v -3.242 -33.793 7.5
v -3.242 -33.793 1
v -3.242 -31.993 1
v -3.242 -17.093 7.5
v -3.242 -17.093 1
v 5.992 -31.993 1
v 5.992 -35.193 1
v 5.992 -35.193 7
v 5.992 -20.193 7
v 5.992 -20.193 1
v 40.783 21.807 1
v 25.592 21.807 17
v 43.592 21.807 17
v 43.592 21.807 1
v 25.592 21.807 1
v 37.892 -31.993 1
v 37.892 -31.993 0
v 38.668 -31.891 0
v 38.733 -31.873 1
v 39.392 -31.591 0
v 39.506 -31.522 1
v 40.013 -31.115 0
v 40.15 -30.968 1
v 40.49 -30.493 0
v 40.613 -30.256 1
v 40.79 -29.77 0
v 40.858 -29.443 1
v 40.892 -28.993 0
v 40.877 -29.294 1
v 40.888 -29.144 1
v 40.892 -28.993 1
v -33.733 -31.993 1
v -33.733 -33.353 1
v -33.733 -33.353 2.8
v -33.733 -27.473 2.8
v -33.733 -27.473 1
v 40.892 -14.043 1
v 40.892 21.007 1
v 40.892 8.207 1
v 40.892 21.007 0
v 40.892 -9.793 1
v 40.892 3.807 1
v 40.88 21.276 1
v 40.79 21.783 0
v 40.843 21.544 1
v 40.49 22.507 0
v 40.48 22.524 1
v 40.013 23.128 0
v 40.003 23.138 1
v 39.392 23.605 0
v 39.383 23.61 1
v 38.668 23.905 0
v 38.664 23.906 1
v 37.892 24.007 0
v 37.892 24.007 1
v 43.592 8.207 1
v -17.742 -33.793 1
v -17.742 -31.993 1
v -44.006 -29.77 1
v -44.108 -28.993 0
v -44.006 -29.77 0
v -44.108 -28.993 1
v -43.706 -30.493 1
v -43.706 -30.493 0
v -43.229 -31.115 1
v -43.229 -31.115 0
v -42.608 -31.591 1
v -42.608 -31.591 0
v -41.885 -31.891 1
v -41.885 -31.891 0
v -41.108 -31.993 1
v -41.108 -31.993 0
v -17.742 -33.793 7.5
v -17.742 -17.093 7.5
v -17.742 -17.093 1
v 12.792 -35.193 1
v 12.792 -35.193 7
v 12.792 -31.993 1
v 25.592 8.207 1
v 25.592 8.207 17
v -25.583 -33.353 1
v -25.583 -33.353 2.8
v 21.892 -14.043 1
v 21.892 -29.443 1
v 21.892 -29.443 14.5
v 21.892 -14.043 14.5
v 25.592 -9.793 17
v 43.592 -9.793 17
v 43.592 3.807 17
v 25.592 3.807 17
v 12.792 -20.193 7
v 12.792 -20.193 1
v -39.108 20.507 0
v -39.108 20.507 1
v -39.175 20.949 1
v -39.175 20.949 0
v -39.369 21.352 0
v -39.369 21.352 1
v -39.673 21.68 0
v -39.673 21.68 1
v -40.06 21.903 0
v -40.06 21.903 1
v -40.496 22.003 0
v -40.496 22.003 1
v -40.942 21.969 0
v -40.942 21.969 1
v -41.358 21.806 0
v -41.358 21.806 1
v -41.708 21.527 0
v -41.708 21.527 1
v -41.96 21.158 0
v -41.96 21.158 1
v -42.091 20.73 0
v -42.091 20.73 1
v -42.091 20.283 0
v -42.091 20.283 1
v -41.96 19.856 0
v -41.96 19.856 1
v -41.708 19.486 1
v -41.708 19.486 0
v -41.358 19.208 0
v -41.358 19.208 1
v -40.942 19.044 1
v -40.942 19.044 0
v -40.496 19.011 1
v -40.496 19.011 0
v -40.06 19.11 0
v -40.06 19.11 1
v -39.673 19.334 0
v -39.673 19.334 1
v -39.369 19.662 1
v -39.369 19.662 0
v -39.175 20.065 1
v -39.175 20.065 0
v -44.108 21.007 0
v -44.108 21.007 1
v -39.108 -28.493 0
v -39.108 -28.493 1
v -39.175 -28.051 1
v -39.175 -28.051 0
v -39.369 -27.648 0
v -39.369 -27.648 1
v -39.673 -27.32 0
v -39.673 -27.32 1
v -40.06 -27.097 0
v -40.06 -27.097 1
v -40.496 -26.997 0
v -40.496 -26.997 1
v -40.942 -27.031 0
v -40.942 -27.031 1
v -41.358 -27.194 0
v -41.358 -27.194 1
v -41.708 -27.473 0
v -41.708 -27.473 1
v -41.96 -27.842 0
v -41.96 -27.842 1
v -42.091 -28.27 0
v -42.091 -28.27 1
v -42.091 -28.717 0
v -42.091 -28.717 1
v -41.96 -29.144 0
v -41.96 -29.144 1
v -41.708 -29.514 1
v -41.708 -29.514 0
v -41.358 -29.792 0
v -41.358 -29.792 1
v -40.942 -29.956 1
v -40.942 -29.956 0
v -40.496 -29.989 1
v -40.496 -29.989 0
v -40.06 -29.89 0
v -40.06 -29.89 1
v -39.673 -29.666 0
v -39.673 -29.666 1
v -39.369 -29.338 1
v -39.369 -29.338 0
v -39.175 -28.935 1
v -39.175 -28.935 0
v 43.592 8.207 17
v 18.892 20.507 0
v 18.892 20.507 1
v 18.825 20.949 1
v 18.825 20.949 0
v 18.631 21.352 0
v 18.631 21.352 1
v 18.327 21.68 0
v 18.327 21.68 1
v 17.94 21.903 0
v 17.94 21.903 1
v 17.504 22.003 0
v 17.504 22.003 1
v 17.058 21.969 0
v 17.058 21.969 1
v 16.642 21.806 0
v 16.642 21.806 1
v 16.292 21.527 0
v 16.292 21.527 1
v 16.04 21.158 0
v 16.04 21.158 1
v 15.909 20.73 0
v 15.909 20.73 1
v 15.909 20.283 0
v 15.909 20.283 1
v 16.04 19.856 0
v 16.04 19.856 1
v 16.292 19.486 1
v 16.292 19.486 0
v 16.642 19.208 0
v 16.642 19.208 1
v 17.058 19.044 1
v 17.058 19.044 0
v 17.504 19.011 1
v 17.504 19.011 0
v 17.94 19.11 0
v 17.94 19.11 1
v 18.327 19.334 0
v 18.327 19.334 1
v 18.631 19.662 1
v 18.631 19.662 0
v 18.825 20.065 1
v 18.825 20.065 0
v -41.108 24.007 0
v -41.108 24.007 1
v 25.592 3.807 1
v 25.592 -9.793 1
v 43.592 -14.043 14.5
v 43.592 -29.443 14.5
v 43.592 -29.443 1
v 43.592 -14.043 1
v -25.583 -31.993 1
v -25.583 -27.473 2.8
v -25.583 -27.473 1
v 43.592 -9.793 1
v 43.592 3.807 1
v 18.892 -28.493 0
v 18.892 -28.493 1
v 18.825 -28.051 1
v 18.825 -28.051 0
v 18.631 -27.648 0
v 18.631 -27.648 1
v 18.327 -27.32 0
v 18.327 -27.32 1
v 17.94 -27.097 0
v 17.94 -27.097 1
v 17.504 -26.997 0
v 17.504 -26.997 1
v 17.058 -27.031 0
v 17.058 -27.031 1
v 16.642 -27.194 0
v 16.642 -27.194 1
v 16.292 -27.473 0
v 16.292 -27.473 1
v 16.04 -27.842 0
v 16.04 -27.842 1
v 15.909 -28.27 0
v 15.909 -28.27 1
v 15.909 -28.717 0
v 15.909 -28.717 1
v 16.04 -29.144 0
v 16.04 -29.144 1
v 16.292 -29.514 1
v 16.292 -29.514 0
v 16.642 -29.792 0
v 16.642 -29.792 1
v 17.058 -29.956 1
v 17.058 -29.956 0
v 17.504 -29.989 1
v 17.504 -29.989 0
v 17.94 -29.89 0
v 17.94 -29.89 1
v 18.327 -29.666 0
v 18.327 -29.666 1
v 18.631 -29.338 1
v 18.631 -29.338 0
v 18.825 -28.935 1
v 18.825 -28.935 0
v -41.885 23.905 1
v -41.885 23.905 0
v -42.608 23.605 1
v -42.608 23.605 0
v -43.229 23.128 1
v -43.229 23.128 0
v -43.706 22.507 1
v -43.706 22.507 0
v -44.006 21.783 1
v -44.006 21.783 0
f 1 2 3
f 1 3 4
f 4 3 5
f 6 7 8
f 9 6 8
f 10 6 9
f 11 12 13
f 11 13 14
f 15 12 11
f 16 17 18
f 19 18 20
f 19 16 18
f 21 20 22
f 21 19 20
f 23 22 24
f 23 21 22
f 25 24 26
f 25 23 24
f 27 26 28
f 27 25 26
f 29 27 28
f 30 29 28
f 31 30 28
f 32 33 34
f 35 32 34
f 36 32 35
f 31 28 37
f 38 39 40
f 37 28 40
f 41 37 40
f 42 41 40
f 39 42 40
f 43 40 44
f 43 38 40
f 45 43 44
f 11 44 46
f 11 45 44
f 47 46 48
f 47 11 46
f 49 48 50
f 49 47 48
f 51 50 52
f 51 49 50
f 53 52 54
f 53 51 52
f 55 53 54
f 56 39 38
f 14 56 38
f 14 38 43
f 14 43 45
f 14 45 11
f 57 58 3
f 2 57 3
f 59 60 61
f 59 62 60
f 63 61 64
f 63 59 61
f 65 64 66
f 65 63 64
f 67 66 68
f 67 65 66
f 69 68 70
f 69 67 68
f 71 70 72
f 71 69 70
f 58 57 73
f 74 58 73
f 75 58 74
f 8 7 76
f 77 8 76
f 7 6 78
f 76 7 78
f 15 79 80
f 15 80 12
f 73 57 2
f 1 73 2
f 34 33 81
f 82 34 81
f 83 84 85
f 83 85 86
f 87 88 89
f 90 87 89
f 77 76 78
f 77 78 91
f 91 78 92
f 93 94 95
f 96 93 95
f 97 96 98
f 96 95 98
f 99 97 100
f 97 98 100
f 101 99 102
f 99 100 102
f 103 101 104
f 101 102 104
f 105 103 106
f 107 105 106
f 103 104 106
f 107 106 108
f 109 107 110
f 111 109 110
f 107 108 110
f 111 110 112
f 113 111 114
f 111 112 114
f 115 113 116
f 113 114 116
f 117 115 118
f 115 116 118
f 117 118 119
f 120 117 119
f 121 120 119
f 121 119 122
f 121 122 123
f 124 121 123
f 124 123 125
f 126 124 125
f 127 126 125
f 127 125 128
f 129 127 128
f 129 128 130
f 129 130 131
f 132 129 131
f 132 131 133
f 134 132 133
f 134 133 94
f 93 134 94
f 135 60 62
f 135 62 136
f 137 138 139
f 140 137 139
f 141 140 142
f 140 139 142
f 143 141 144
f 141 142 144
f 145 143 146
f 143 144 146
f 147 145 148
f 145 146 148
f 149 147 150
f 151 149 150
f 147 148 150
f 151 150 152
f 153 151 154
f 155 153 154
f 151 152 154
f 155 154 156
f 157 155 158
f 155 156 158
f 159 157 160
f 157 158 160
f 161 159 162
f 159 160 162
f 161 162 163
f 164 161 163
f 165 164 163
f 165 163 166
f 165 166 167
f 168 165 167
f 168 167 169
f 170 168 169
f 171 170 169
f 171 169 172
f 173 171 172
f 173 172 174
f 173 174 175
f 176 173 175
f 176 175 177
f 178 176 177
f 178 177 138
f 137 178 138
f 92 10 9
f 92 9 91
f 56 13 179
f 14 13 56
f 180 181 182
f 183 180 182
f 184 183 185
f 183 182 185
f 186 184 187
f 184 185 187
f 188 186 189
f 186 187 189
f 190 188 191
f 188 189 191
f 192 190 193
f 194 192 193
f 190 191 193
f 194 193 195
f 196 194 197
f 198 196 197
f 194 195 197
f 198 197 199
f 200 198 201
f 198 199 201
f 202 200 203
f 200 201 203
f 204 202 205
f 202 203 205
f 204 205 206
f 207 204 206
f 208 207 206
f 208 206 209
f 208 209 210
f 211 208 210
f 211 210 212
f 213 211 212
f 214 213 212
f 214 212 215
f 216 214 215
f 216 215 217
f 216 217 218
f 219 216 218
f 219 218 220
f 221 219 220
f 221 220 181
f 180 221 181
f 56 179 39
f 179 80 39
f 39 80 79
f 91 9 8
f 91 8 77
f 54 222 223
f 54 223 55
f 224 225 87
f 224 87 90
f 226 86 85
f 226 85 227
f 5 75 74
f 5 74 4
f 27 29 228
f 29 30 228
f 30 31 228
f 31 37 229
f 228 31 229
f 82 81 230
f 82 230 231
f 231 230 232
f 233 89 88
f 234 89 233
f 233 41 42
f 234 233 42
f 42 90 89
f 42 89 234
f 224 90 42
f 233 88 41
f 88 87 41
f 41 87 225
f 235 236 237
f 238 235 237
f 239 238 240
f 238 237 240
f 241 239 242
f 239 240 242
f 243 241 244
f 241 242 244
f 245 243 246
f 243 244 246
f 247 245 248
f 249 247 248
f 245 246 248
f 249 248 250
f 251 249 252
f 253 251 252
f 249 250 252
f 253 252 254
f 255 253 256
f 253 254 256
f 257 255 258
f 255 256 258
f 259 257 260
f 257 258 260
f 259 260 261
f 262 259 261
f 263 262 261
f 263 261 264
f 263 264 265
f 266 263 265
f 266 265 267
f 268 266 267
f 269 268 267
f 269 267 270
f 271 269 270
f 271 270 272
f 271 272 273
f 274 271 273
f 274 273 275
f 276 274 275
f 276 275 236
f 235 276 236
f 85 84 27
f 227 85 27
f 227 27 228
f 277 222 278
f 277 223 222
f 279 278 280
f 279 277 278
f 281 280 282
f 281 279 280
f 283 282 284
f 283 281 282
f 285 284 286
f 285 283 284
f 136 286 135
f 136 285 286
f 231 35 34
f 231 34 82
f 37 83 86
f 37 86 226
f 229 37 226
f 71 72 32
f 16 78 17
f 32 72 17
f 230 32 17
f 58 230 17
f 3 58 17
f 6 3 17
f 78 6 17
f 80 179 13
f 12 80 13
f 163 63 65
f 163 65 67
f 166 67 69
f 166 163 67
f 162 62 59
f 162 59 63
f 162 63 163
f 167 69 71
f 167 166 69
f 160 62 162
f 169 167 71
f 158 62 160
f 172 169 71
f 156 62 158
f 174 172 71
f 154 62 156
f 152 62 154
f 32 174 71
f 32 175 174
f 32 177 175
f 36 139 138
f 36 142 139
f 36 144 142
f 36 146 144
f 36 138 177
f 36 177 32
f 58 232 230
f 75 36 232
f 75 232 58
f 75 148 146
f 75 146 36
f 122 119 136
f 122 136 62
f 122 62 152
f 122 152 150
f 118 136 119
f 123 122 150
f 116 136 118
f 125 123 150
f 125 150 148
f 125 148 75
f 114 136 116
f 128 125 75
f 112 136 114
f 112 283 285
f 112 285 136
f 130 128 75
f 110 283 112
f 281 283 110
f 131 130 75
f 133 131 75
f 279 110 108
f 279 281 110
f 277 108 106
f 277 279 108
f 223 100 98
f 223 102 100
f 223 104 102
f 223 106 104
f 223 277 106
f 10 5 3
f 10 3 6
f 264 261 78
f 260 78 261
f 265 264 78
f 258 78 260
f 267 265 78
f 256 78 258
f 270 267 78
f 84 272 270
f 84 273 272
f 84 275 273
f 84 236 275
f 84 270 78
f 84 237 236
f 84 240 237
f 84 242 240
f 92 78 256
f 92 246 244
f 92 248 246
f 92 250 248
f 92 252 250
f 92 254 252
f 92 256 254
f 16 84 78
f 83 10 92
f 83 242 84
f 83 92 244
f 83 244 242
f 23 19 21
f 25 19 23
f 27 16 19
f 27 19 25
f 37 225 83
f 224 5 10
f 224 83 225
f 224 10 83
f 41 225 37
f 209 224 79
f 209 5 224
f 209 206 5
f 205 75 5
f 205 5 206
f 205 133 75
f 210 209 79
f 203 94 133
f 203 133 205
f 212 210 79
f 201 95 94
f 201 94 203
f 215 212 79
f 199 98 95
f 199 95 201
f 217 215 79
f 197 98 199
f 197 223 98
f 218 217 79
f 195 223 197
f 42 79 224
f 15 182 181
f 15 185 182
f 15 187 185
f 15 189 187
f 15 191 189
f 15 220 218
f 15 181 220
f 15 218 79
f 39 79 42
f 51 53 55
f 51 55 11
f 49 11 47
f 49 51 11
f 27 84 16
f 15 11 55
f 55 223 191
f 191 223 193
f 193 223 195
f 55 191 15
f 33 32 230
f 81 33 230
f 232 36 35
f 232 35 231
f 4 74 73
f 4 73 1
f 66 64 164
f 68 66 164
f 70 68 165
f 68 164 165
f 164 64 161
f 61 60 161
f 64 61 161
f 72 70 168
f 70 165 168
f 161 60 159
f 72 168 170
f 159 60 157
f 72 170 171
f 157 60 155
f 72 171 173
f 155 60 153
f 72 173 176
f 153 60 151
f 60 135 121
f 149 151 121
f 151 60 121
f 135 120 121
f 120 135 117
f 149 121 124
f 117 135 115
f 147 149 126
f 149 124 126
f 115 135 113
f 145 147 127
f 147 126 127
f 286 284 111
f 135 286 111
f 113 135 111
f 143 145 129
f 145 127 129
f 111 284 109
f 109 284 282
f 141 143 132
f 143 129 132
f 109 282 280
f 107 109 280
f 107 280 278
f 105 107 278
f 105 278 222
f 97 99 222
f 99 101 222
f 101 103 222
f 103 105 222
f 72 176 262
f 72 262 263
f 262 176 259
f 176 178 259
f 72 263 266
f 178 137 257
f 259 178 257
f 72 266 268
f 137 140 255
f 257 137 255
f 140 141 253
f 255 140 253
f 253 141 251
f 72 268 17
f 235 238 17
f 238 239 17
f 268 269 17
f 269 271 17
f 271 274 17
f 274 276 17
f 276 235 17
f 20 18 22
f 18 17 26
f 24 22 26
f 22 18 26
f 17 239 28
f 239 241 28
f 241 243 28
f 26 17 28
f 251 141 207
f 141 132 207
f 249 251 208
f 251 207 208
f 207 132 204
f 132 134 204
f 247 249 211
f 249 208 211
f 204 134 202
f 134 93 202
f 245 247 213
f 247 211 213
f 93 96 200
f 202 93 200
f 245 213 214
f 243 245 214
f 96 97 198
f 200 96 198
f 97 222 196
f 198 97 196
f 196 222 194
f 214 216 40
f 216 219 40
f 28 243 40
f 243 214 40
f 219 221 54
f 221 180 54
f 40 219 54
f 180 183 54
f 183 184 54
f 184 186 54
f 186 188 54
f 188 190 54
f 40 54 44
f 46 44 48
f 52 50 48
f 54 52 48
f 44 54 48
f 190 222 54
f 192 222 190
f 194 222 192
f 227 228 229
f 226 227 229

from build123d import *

# Parameters (mm, degrees)
ESQUISSE1_W                = 85
ESQUISSE1_H                = 56
BOSS_EXTRU_1_DEPTH         = 1
CONG_3_R                   = 3
CONG_4_R                   = 3
CONG_5_R                   = 3
CONG_6_R                   = 3
ESQUISSE2_R                = 1.5
ENL_V_MAT_EXTRU_1_DEPTH    = 55.498557908
ESQUISSE3_W                = 15.3
ESQUISSE3_H                = 13.6
BOSS_EXTRU_3_DEPTH         = 16
ESQUISSE5_W                = 16
ESQUISSE5_H                = 13.6
BOSS_EXTRU_4_DEPTH         = 2.7
R_P_TITION_LIN_AIRE1_COUNT = 2
R_P_TITION_LIN_AIRE1_PITCH = 18
R_P_TITION_LIN_AIRE2_COUNT = 2
R_P_TITION_LIN_AIRE2_PITCH = 18
ESQUISSE7_W                = 21.7
ESQUISSE7_H                = 15.4
BOSS_EXTRU_5_DEPTH         = 13.5
ESQUISSE8_W                = 6.8
ESQUISSE8_H                = 15
BOSS_EXTRU_6_DEPTH         = 6
ESQUISSE9_W                = 14.5
ESQUISSE9_H                = 16.7
BOSS_EXTRU_7_DEPTH         = 6.5
ESQUISSE10_W               = 8.15
ESQUISSE10_H               = 5.88
BOSS_EXTRU_8_DEPTH         = 1.8


with BuildPart() as part:
    # Esquisse1 → Boss.-Extru.1 (new body)
    with BuildSketch(Plane.XY):
        with Locations((-1.608108108, -3.993243243)):
            Rectangle(ESQUISSE1_W, ESQUISSE1_H)
    extrude(amount=BOSS_EXTRU_1_DEPTH)

    # Congé3
    cong_3_edges = [part.edges().sort_by_distance(p)[0] for p in [
        (40.891891892, 24.006756757, 0.5),
    ]]
    fillet(cong_3_edges, radius=CONG_3_R)

    # Congé4
    cong_4_edges = [part.edges().sort_by_distance(p)[0] for p in [
        (-44.108108108, 24.006756757, 0.5),
    ]]
    fillet(cong_4_edges, radius=CONG_4_R)

    # Congé5
    cong_5_edges = [part.edges().sort_by_distance(p)[0] for p in [
        (-44.108108108, -31.993243243, 0.5),
    ]]
    fillet(cong_5_edges, radius=CONG_5_R)

    # Congé6
    cong_6_edges = [part.edges().sort_by_distance(p)[0] for p in [
        (40.891891892, -31.993243243, 0.5),
    ]]
    fillet(cong_6_edges, radius=CONG_6_R)

    # Esquisse2 → Enlèv. mat.-Extru.1 (cut, through all)
    with BuildSketch(Plane.XY.offset(1)):
        with Locations((-40.608108108, 20.506756757)):
            Circle(ESQUISSE2_R)
        with Locations((-40.608108108, -28.493243243)):
            Circle(ESQUISSE2_R)
        with Locations((17.391891892, -28.493243243)):
            Circle(ESQUISSE2_R)
        with Locations((17.391891892, 20.506756757)):
            Circle(ESQUISSE2_R)
    extrude(amount=-ENL_V_MAT_EXTRU_1_DEPTH, mode=Mode.SUBTRACT)

    # Esquisse3 → Boss.-Extru.3 (add)
    with BuildSketch(Plane.XY.offset(1)):
        with Locations((33.241891892, 15.006756757)):
            Rectangle(ESQUISSE3_W, ESQUISSE3_H)
    boss_extru_3 = extrude(amount=BOSS_EXTRU_3_DEPTH)

    # Esquisse5 → Boss.-Extru.4 (add)
    with BuildSketch(Plane(origin=(40.891891892, 0, 0), x_dir=(0, 0, -1), z_dir=(1, 0, 0))):
        with Locations((-9, 15.006756757)):
            Rectangle(ESQUISSE5_W, ESQUISSE5_H)
    boss_extru_4 = extrude(amount=BOSS_EXTRU_4_DEPTH)

    # Répétition linéaire1: Boss.-Extru.3 ×2
    with Locations(*[(0, -i * R_P_TITION_LIN_AIRE1_PITCH, 0) for i in range(1, R_P_TITION_LIN_AIRE1_COUNT)]):
        add(boss_extru_3)

    # Répétition linéaire2: Boss.-Extru.4 ×2
    with Locations(*[(0, -i * R_P_TITION_LIN_AIRE2_PITCH, 0) for i in range(1, R_P_TITION_LIN_AIRE2_COUNT)]):
        add(boss_extru_4)

    # Esquisse7 → Boss.-Extru.5 (add)
    with BuildSketch(Plane.XY.offset(1)):
        with Locations((32.741891892, -21.743243243)):
            Rectangle(ESQUISSE7_W, ESQUISSE7_H)
    extrude(amount=BOSS_EXTRU_5_DEPTH)

    # Esquisse8 → Boss.-Extru.6 (add)
    with BuildSketch(Plane.XY.offset(1)):
        with Locations((9.391891892, -27.693243243)):
            Rectangle(ESQUISSE8_W, ESQUISSE8_H)
    extrude(amount=BOSS_EXTRU_6_DEPTH)

    # Esquisse9 → Boss.-Extru.7 (add)
    with BuildSketch(Plane.XY.offset(1)):
        with Locations((-10.491721189, -25.443243243)):
            Rectangle(ESQUISSE9_W, ESQUISSE9_H)
    extrude(amount=BOSS_EXTRU_7_DEPTH)

    # Esquisse10 → Boss.-Extru.8 (add)
    with BuildSketch(Plane.XY.offset(1)):
        with Locations((-29.658093883, -30.413243243)):
            Rectangle(ESQUISSE10_W, ESQUISSE10_H)
    extrude(amount=BOSS_EXTRU_8_DEPTH)


solid = part.part
